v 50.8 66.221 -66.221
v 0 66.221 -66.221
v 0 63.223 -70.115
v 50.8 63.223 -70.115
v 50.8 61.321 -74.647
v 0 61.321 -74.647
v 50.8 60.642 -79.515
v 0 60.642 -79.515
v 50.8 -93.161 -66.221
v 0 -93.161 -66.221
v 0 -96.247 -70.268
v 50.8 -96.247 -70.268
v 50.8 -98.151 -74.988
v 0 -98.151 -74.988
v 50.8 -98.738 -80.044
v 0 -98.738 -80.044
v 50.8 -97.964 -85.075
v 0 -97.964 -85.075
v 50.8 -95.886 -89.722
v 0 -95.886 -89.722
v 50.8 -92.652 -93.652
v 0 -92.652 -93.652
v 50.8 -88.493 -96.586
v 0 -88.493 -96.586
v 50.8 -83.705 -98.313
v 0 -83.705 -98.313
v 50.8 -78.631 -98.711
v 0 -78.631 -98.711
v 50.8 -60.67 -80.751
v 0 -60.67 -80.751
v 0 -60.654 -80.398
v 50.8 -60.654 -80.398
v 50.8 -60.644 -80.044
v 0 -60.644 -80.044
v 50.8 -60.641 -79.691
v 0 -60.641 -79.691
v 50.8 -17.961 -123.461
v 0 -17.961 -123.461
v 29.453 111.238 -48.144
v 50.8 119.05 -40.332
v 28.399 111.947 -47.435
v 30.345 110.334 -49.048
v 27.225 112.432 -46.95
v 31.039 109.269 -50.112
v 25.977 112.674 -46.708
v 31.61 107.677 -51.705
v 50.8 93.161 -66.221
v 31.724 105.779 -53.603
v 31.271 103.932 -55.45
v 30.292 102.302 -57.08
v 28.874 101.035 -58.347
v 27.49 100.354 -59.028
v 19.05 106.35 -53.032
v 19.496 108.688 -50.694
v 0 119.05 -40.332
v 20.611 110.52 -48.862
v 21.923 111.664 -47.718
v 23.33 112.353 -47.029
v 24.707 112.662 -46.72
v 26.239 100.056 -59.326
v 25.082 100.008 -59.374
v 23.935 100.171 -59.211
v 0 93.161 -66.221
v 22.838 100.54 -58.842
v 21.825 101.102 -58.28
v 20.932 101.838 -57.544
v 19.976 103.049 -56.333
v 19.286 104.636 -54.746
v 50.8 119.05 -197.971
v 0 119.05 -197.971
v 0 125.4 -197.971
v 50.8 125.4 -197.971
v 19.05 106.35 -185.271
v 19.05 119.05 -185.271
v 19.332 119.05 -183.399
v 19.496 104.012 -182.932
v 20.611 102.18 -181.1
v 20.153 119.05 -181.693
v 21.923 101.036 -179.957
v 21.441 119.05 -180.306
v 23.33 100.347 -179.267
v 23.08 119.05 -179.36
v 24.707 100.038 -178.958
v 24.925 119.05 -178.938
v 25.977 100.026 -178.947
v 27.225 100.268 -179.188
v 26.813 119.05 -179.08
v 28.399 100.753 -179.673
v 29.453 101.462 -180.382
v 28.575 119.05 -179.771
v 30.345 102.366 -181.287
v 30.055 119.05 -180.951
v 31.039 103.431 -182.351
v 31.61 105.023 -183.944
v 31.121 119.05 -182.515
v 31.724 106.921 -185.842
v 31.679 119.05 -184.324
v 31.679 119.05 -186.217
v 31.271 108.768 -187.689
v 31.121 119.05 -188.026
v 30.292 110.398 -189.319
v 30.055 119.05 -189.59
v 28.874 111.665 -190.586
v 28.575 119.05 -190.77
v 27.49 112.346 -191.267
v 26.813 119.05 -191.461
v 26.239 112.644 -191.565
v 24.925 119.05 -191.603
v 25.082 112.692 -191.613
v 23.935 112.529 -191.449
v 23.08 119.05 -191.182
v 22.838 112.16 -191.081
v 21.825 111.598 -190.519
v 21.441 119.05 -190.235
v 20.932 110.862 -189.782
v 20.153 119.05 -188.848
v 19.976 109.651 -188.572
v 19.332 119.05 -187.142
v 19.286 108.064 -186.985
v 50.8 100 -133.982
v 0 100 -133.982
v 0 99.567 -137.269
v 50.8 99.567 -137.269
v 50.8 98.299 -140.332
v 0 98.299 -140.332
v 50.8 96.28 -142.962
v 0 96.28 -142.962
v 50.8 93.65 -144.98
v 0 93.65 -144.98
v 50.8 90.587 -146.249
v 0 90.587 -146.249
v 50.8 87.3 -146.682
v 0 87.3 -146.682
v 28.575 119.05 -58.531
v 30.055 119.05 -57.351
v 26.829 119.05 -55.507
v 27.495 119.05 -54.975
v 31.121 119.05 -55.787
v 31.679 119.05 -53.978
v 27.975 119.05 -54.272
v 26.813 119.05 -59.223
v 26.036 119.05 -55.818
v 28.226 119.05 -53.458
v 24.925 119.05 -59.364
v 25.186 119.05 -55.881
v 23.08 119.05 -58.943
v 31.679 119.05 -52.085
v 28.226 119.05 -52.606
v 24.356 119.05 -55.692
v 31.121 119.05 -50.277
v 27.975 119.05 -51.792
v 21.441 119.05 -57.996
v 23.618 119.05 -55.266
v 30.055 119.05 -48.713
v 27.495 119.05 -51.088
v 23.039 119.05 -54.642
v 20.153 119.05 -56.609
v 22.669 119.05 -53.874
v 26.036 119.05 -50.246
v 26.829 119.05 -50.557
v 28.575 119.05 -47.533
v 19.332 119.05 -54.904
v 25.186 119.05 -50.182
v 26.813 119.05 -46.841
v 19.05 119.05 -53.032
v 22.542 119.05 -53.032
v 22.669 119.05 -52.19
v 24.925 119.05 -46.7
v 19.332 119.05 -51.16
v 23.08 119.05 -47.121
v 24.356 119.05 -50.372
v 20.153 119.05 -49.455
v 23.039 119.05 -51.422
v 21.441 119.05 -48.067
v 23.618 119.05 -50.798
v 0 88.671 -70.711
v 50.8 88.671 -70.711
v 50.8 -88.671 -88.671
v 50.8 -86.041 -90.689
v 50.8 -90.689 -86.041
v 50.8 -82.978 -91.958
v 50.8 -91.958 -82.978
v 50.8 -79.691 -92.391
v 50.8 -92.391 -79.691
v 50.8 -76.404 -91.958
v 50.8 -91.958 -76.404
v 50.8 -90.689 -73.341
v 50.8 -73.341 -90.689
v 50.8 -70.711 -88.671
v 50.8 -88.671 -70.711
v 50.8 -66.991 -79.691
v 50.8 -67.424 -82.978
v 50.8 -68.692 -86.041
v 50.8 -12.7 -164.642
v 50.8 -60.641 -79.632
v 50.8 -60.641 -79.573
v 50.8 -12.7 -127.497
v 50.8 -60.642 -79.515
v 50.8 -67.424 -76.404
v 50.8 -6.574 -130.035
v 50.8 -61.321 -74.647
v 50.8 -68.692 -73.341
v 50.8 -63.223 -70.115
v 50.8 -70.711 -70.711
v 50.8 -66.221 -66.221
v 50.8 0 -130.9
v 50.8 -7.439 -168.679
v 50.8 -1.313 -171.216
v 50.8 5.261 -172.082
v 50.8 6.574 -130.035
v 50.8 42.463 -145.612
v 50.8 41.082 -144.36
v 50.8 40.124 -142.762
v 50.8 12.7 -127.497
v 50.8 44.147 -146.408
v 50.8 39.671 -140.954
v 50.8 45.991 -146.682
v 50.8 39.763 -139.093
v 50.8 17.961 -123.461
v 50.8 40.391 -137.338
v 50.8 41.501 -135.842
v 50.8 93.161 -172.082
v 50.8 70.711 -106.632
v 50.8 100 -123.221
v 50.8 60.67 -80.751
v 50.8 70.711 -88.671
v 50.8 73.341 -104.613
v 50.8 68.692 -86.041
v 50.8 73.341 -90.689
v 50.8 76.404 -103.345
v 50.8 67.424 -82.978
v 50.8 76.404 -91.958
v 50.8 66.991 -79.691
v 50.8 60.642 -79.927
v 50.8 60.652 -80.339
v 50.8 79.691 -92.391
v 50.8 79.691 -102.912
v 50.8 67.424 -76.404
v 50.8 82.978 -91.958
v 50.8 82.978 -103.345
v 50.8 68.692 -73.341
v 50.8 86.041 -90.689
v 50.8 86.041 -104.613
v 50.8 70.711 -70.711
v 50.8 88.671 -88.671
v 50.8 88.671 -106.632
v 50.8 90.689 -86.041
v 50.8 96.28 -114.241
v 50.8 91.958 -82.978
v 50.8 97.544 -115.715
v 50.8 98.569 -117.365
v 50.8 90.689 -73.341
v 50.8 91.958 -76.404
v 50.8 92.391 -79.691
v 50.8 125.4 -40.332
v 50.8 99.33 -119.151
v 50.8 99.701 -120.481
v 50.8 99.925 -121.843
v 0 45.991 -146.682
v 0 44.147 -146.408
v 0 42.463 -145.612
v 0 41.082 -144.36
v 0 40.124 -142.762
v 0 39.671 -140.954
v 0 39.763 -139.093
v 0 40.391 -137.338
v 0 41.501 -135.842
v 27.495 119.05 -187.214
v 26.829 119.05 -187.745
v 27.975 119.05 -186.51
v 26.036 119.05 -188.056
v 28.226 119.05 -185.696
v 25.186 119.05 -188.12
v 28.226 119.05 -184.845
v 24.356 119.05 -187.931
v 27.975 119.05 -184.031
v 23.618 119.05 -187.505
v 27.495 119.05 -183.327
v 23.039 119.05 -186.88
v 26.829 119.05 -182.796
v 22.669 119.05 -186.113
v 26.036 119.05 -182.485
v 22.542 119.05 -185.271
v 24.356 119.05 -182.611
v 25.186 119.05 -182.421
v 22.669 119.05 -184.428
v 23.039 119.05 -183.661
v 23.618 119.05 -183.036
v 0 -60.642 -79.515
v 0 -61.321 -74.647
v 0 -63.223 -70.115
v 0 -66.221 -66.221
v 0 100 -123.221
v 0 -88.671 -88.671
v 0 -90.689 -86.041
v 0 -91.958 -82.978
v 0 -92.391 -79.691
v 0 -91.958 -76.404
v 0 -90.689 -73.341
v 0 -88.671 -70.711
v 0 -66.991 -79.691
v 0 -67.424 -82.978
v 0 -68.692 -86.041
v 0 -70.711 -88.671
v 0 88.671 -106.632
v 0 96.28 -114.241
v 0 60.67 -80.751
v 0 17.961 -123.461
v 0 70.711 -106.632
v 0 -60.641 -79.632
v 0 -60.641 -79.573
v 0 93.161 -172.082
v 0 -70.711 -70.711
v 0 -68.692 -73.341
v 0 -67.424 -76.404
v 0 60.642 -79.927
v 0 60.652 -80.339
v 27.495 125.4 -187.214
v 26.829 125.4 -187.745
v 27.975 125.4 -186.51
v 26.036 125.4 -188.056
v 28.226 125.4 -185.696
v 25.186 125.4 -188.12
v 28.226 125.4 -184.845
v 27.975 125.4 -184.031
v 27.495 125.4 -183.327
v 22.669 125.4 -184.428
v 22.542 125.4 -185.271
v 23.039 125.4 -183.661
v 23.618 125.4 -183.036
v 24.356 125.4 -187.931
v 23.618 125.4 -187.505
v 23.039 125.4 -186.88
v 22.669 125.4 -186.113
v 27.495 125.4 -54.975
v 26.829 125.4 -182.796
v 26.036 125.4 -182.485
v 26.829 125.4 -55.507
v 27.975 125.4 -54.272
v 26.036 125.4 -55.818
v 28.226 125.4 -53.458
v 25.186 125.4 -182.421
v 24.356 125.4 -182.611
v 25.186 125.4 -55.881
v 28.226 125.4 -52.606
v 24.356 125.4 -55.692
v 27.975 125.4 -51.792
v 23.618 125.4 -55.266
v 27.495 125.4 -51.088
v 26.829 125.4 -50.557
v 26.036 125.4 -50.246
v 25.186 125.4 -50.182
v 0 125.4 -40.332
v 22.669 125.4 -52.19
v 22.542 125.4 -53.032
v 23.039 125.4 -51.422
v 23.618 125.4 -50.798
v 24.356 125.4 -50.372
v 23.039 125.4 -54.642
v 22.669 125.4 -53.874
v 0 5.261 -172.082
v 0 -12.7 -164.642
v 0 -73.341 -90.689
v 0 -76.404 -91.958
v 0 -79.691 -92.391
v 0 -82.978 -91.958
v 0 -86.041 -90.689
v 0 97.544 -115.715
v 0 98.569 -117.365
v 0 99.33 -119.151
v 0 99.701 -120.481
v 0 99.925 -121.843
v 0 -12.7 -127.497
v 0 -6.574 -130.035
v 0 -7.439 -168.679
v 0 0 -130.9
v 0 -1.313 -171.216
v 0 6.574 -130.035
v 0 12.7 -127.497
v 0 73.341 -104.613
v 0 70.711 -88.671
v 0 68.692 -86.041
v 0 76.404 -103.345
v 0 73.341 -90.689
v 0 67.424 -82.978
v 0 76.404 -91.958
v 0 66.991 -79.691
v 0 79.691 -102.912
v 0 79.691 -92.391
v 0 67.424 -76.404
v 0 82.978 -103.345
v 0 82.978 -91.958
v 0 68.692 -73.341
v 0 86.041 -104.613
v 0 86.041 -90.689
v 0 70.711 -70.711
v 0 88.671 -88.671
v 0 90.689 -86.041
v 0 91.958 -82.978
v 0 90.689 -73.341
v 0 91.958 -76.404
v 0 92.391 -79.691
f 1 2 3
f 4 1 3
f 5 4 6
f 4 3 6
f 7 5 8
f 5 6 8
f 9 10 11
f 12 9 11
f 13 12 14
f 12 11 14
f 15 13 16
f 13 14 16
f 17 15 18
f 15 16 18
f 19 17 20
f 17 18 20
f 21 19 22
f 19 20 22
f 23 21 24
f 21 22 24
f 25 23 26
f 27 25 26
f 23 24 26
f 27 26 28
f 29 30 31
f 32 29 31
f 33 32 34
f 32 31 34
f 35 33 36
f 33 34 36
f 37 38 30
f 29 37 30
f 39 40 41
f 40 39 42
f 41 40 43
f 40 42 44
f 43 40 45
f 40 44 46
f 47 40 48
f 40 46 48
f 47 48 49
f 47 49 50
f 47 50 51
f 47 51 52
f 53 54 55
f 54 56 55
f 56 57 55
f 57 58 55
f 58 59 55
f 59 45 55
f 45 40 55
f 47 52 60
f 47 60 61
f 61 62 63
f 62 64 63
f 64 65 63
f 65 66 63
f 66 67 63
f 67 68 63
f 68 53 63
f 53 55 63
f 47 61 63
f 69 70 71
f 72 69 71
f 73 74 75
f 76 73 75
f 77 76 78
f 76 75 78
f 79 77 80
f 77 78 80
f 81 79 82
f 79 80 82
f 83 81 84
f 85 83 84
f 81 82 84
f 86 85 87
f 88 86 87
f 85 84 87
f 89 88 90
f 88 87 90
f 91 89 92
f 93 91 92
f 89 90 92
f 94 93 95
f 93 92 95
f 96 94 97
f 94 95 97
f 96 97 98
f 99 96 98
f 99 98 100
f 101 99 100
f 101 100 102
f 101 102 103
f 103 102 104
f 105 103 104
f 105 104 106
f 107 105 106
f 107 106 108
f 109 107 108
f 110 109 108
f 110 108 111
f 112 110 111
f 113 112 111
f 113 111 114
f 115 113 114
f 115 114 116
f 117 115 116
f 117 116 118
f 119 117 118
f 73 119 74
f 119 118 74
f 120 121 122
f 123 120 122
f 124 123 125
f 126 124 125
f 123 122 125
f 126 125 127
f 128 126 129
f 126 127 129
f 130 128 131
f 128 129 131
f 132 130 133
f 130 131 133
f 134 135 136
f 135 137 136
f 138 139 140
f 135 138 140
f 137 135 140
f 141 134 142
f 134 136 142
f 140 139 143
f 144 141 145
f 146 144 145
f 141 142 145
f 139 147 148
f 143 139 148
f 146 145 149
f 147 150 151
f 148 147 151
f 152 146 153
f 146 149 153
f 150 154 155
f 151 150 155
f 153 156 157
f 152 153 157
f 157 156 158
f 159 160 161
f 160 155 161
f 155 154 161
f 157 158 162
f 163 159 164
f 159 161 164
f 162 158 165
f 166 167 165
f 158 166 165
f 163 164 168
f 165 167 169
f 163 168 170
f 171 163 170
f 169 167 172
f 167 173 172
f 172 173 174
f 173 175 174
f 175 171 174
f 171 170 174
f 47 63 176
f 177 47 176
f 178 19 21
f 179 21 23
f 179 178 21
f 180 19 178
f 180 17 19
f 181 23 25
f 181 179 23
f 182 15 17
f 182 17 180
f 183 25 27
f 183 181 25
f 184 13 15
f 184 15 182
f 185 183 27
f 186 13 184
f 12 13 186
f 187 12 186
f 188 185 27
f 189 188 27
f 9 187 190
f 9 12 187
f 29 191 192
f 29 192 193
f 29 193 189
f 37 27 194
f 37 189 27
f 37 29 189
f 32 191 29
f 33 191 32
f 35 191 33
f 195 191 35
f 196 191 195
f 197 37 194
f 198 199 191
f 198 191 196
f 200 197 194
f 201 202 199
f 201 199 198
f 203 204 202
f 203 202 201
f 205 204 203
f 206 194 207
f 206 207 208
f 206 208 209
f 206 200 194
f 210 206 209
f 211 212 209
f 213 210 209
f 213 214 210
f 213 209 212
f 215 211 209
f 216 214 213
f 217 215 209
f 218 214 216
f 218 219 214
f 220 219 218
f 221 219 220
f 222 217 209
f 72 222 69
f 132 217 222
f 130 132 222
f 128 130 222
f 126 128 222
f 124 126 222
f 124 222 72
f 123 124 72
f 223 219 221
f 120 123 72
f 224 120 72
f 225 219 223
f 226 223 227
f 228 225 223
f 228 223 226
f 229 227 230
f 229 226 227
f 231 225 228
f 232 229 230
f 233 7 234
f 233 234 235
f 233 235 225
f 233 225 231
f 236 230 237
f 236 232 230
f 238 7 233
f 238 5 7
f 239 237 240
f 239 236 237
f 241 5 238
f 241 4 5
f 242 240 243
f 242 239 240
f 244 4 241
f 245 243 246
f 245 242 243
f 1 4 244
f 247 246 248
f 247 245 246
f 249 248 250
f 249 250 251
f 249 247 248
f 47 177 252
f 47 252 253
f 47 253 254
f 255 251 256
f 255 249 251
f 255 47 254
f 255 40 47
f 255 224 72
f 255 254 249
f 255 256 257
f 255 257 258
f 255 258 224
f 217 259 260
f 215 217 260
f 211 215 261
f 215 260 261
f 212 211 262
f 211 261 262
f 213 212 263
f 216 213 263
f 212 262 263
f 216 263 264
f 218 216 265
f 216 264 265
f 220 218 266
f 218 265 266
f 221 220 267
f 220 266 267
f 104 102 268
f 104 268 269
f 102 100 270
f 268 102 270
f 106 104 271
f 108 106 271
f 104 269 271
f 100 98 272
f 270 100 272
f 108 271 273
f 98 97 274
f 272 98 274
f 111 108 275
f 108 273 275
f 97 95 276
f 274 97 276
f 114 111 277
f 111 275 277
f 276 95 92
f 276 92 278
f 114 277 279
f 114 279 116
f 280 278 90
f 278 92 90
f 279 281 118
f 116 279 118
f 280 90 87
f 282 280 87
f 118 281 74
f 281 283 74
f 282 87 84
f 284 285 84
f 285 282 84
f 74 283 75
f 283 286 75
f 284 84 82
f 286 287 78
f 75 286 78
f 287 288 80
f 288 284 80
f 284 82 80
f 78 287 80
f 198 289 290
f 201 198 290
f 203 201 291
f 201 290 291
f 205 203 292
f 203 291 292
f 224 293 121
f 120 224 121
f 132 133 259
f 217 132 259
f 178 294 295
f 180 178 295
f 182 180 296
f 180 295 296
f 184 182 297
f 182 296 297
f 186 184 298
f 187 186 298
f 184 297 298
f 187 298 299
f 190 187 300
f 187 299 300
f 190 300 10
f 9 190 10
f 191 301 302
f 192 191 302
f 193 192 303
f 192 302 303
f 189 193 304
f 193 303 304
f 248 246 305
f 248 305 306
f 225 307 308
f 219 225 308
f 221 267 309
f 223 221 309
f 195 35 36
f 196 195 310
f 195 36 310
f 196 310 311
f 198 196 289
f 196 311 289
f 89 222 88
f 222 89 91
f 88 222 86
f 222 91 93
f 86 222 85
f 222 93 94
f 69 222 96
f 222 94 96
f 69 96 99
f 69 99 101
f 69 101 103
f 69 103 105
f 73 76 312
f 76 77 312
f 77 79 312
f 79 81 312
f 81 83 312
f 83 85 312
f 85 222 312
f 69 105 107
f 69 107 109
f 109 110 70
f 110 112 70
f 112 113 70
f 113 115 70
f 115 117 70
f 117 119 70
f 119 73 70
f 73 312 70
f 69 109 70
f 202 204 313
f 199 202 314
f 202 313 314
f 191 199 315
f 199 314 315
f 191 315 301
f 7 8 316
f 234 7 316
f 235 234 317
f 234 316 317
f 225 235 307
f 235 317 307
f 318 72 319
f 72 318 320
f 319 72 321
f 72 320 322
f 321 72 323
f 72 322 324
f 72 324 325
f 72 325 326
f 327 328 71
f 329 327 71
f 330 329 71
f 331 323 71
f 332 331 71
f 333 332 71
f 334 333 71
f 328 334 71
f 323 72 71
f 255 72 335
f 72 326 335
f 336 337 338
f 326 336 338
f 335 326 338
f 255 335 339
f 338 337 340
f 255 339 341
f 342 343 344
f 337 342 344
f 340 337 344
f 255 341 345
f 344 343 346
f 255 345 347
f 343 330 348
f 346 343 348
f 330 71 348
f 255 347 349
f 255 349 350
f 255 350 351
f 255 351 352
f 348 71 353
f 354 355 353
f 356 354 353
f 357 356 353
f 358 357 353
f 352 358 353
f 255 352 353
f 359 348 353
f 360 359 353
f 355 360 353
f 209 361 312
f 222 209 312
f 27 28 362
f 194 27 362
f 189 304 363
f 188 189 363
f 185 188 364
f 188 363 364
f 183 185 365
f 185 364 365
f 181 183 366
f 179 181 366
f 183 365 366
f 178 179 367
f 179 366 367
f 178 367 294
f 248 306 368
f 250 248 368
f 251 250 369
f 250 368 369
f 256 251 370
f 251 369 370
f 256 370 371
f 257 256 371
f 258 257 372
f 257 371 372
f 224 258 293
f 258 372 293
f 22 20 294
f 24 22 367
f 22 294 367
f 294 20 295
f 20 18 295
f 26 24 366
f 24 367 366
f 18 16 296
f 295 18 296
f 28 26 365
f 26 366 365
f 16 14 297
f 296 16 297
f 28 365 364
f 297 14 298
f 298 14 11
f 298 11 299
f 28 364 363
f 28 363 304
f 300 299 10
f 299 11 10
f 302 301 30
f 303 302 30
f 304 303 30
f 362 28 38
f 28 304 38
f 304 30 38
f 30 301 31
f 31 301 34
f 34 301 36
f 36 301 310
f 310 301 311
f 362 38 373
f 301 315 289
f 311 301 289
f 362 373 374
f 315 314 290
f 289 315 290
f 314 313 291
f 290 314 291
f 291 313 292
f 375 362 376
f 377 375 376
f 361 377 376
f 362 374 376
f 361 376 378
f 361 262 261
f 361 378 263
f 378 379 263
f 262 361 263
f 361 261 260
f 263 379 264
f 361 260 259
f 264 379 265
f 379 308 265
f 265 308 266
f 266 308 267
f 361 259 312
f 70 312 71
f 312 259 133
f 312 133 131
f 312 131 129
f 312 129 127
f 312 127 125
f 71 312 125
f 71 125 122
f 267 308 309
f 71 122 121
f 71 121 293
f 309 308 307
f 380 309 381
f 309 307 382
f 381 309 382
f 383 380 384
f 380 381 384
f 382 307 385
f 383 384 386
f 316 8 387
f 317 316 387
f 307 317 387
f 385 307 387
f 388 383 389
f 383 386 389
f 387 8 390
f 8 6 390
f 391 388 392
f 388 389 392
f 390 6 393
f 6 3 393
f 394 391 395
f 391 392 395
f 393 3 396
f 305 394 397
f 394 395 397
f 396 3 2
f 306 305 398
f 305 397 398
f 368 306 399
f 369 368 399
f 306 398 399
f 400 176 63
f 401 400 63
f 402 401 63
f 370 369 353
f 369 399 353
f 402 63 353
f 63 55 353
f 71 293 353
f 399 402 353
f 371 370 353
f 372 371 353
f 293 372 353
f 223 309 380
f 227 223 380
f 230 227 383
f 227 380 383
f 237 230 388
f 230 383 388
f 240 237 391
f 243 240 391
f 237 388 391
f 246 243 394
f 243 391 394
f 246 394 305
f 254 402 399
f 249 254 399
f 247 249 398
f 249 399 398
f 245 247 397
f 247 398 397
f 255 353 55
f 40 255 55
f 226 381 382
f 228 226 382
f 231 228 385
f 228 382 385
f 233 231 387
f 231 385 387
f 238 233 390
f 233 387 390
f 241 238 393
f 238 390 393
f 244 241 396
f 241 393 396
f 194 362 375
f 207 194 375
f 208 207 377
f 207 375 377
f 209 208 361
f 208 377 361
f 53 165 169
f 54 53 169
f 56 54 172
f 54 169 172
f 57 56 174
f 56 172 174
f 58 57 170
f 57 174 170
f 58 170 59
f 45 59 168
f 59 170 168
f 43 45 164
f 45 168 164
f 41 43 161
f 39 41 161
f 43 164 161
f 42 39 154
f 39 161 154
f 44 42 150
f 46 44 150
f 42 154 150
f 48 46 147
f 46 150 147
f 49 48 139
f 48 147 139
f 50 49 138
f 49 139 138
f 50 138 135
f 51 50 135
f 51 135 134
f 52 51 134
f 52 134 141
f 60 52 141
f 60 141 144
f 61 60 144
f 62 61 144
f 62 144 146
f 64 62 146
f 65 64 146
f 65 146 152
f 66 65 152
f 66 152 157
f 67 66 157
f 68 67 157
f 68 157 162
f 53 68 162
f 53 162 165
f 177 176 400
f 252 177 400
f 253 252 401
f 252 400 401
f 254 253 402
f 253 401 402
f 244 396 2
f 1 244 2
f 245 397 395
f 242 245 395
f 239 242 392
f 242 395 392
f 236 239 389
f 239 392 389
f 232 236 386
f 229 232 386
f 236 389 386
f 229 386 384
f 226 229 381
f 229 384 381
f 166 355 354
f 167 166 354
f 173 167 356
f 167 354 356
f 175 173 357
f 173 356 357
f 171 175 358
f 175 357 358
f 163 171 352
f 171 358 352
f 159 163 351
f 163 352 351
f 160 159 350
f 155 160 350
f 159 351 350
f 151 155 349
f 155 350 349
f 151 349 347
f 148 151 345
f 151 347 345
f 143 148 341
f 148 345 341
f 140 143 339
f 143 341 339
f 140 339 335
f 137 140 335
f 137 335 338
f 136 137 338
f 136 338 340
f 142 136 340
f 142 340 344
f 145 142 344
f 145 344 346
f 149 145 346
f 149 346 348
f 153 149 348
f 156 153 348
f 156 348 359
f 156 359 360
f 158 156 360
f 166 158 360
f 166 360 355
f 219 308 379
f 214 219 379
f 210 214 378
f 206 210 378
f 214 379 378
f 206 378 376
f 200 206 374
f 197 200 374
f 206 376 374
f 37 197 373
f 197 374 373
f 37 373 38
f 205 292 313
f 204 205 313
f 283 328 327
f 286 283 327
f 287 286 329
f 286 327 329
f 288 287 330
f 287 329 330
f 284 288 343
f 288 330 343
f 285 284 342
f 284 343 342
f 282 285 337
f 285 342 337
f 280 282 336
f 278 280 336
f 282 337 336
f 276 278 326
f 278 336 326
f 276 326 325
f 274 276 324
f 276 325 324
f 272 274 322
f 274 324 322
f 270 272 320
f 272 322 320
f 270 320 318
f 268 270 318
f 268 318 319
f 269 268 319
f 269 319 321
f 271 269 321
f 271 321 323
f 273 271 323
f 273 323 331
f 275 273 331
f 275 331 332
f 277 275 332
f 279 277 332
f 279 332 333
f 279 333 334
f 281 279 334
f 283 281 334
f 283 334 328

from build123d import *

# Parameters (mm, degrees)
F1_DEPTH = 50.8
F2_R     = 2.8575
F3_DEPTH = 224.1419342397
F5_R     = 6.35
F5_R_2   = 2.8575
F6_DEPTH = 217.7919342397


with BuildPart() as f1:
    # F0 (on Right) → F1 (new body)
    with BuildSketch(Plane.YZ):
        with BuildLine():
            Line((-66.2205500581, -66.2205500581), (-70.7106781187, -70.7106781187))
            ThreePointArc((-70.7106781187, -70.7106781187), (-65.8235712608, -75.2811893269), (-60.6417499855, -79.5146411593))
            ThreePointArc((-60.6417499855, -79.5146411593), (-62.1249501408, -72.3194552405), (-66.2205500581, -66.2205500581))
        make_face()
        with BuildLine():
            Line((-60.6704465476, -80.7509096897), (-70.7106781187, -70.7106781187))
            ThreePointArc((-70.7106781187, -70.7106781187), (-67.9576641768, -74.8308546487), (-66.9909342397, -79.6909342397))
            ThreePointArc((-66.9909342397, -79.6909342397), (-67.9576641768, -84.5510138308), (-70.7106781187, -88.6711903608))
            Line((-70.7106781187, -88.6711903608), (-66.2205500581, -93.1613184213))
            ThreePointArc((-66.2205500581, -93.1613184213), (-62.3007430389, -87.4680641731), (-60.6704465476, -80.7509096897))
        make_face()
        with BuildLine():
            ThreePointArc((-60.6417499855, -79.5146411593), (-65.8235712608, -75.2811893269), (-70.7106781187, -70.7106781187))
            Line((-70.7106781187, -70.7106781187), (-60.6704465476, -80.7509096897))
            ThreePointArc((-60.6704465476, -80.7509096897), (-60.648313746, -80.2211273486), (-60.6409342397, -79.6909342397))
            ThreePointArc((-60.6409342397, -79.6909342397), (-60.6411381773, -79.6027867559), (-60.6417499855, -79.5146411593))
        make_face()
        with BuildLine():
            Line((60.6704465476, -80.7509096897), (70.7106781187, -70.7106781187))
            ThreePointArc((70.7106781187, -70.7106781187), (65.8235712608, -75.2811893269), (60.6417499855, -79.5146411593))
            ThreePointArc((60.6417499855, -79.5146411593), (60.6460643138, -80.133008335), (60.6704465476, -80.7509096897))
        make_face()
        with BuildLine():
            ThreePointArc((60.6417499855, -79.5146411593), (65.8235712608, -75.2811893269), (70.7106781187, -70.7106781187))
            Line((70.7106781187, -70.7106781187), (66.2205500581, -66.2205500581))
            ThreePointArc((66.2205500581, -66.2205500581), (62.1249501408, -72.3194552405), (60.6417499855, -79.5146411593))
        make_face()
        with BuildLine():
            ThreePointArc((70.7106781187, -88.6711903608), (66.9909342397, -79.6909342397), (70.7106781187, -70.7106781187))
            Line((70.7106781187, -70.7106781187), (60.6704465476, -80.7509096897))
            ThreePointArc((60.6704465476, -80.7509096897), (62.3007430389, -87.4680641731), (66.2205500581, -93.1613184213))
            Line((66.2205500581, -93.1613184213), (70.7106781187, -88.6711903608))
        make_face()
        with BuildLine():
            ThreePointArc((98.7409342397, -79.6909342397), (97.2908393341, -72.4008148532), (93.1613184213, -66.2205500581))
            Line((93.1613184213, -66.2205500581), (88.6711903608, -70.7106781187))
            ThreePointArc((88.6711903608, -70.7106781187), (91.4242043026, -74.8308546487), (92.3909342397, -79.6909342397))
            ThreePointArc((92.3909342397, -79.6909342397), (91.4242043026, -84.5510138308), (88.6711903608, -88.6711903608))
            Line((88.6711903608, -88.6711903608), (93.1613184213, -93.1613184213))
            ThreePointArc((93.1613184213, -93.1613184213), (97.2908393341, -86.9810536263), (98.7409342397, -79.6909342397))
        make_face()
        Polygon((119.05, -40.3318684794), (93.1613184213, -66.2205500581), (125.4, -66.2205500581), (125.4, -40.3318684794), align=None)
        with BuildLine():
            Line((125.4, -66.2205500581), (93.1613184213, -66.2205500581))
            ThreePointArc((93.1613184213, -66.2205500581), (97.2908393341, -72.4008148532), (98.7409342397, -79.6909342397))
            ThreePointArc((98.7409342397, -79.6909342397), (97.2908393341, -86.9810536263), (93.1613184213, -93.1613184213))
            ThreePointArc((93.1613184213, -93.1613184213), (79.6909342397, -98.7409342397), (66.2205500581, -93.1613184213))
            Line((66.2205500581, -93.1613184213), (0, -159.3818684794))
            Line((0, -159.3818684794), (-66.2205500581, -93.1613184213))
            ThreePointArc((-66.2205500581, -93.1613184213), (-71.9138043064, -97.0811254405), (-78.6309587898, -98.7114219318))
            Line((-78.6309587898, -98.7114219318), (-12.7, -164.6423807216))
            ThreePointArc((-12.7, -164.6423807216), (-4.4596469399, -170.1484086052), (5.2605122421, -172.0818684794))
            Line((5.2605122421, -172.0818684794), (93.1613184213, -172.0818684794))
            Line((93.1613184213, -172.0818684794), (125.4, -172.0818684794))
            Line((125.4, -172.0818684794), (125.4, -119.1512092688))
            Line((125.4, -119.1512092688), (125.4, -66.2205500581))
        make_face()
        with BuildLine():
            ThreePointArc((96.2802561211, -114.2407683632), (98.0883415579, -116.5201524195), (99.3302370763, -119.1512092688))
            ThreePointArc((99.3302370763, -119.1512092688), (99.8314406767, -121.1587455105), (100, -123.2210244843))
            Line((100, -123.2210244843), (100, -133.9818684794))
            ThreePointArc((100, -133.9818684794), (96.2802561211, -142.9621246005), (87.3, -146.6818684794))
            Line((87.3, -146.6818684794), (45.9907683632, -146.6818684794))
            ThreePointArc((45.9907683632, -146.6818684794), (40.1241333318, -142.761908275), (41.5006403027, -135.8417404189))
            Line((41.5006403027, -135.8417404189), (70.7106781187, -106.6317026029))
            ThreePointArc((70.7106781187, -106.6317026029), (79.6909342397, -102.911958724), (88.6711903608, -106.6317026029))
            Line((88.6711903608, -106.6317026029), (96.2802561211, -114.2407683632))
        make_face(mode=Mode.SUBTRACT)
        with BuildLine():
            Line((-17.9605122421, -123.4608439952), (-60.6704465476, -80.7509096897))
            ThreePointArc((-60.6704465476, -80.7509096897), (-62.3007430389, -87.4680641731), (-66.2205500581, -93.1613184213))
            Line((-66.2205500581, -93.1613184213), (0, -159.3818684794))
            Line((0, -159.3818684794), (66.2205500581, -93.1613184213))
            ThreePointArc((66.2205500581, -93.1613184213), (62.3007430389, -87.4680641731), (60.6704465476, -80.7509096897))
            Line((60.6704465476, -80.7509096897), (17.9605122421, -123.4608439952))
            ThreePointArc((17.9605122421, -123.4608439952), (0, -130.900331753), (-17.9605122421, -123.4608439952))
        make_face()
        with BuildLine():
            Line((-88.6711903608, -70.7106781187), (-93.1613184213, -66.2205500581))
            ThreePointArc((-93.1613184213, -66.2205500581), (-97.0811254405, -87.4680641731), (-78.6309587898, -98.7114219318))
            Line((-78.6309587898, -98.7114219318), (-88.6711903608, -88.6711903608))
            ThreePointArc((-88.6711903608, -88.6711903608), (-92.3909342397, -79.6909342397), (-88.6711903608, -70.7106781187))
        make_face()
        with BuildLine():
            ThreePointArc((88.6711903608, -88.6711903608), (79.6909342397, -92.3909342397), (70.7106781187, -88.6711903608))
            Line((70.7106781187, -88.6711903608), (66.2205500581, -93.1613184213))
            ThreePointArc((66.2205500581, -93.1613184213), (79.6909342397, -98.7409342397), (93.1613184213, -93.1613184213))
            Line((93.1613184213, -93.1613184213), (88.6711903608, -88.6711903608))
        make_face()
        with BuildLine():
            Line((-66.2205500581, -93.1613184213), (-70.7106781187, -88.6711903608))
            ThreePointArc((-70.7106781187, -88.6711903608), (-79.6909342397, -92.3909342397), (-88.6711903608, -88.6711903608))
            Line((-88.6711903608, -88.6711903608), (-78.6309587898, -98.7114219318))
            ThreePointArc((-78.6309587898, -98.7114219318), (-71.9138043064, -97.0811254405), (-66.2205500581, -93.1613184213))
        make_face()
        Polygon((125.4, -197.9705500581), (125.4, -172.0818684794), (93.1613184213, -172.0818684794), (119.05, -197.9705500581), align=None)
    extrude(amount=F1_DEPTH)

    # F2 (on face) → F3 (cut, through all)
    with BuildSketch(Plane(origin=(0, 125.4, 0), x_dir=(-1, 0, 0), z_dir=(0, 1, 0))):
        with Locations((-25.4, -185.2705500581)):
            Circle(F2_R)
        with Locations((-25.4, -53.0318684794)):
            Circle(F2_R)
    extrude(amount=-F3_DEPTH, mode=Mode.SUBTRACT)

    # F5 (on offset) → F6 (cut, through all)
    with BuildSketch(Plane(origin=(0, 119.05, 0), x_dir=(-1, 0, 0), z_dir=(0, 1, 0))):
        with Locations((-25.4, -53.0318684794)):
            Circle(F5_R)
        with Locations((-25.4, -53.0318684794)):
            Circle(F5_R_2, mode=Mode.SUBTRACT)
        with Locations((-25.4, -185.2705500581)):
            Circle(F5_R)
        with Locations((-25.4, -185.2705500581)):
            Circle(F5_R_2, mode=Mode.SUBTRACT)
    extrude(amount=-F6_DEPTH, mode=Mode.SUBTRACT)


solid = f1.part
